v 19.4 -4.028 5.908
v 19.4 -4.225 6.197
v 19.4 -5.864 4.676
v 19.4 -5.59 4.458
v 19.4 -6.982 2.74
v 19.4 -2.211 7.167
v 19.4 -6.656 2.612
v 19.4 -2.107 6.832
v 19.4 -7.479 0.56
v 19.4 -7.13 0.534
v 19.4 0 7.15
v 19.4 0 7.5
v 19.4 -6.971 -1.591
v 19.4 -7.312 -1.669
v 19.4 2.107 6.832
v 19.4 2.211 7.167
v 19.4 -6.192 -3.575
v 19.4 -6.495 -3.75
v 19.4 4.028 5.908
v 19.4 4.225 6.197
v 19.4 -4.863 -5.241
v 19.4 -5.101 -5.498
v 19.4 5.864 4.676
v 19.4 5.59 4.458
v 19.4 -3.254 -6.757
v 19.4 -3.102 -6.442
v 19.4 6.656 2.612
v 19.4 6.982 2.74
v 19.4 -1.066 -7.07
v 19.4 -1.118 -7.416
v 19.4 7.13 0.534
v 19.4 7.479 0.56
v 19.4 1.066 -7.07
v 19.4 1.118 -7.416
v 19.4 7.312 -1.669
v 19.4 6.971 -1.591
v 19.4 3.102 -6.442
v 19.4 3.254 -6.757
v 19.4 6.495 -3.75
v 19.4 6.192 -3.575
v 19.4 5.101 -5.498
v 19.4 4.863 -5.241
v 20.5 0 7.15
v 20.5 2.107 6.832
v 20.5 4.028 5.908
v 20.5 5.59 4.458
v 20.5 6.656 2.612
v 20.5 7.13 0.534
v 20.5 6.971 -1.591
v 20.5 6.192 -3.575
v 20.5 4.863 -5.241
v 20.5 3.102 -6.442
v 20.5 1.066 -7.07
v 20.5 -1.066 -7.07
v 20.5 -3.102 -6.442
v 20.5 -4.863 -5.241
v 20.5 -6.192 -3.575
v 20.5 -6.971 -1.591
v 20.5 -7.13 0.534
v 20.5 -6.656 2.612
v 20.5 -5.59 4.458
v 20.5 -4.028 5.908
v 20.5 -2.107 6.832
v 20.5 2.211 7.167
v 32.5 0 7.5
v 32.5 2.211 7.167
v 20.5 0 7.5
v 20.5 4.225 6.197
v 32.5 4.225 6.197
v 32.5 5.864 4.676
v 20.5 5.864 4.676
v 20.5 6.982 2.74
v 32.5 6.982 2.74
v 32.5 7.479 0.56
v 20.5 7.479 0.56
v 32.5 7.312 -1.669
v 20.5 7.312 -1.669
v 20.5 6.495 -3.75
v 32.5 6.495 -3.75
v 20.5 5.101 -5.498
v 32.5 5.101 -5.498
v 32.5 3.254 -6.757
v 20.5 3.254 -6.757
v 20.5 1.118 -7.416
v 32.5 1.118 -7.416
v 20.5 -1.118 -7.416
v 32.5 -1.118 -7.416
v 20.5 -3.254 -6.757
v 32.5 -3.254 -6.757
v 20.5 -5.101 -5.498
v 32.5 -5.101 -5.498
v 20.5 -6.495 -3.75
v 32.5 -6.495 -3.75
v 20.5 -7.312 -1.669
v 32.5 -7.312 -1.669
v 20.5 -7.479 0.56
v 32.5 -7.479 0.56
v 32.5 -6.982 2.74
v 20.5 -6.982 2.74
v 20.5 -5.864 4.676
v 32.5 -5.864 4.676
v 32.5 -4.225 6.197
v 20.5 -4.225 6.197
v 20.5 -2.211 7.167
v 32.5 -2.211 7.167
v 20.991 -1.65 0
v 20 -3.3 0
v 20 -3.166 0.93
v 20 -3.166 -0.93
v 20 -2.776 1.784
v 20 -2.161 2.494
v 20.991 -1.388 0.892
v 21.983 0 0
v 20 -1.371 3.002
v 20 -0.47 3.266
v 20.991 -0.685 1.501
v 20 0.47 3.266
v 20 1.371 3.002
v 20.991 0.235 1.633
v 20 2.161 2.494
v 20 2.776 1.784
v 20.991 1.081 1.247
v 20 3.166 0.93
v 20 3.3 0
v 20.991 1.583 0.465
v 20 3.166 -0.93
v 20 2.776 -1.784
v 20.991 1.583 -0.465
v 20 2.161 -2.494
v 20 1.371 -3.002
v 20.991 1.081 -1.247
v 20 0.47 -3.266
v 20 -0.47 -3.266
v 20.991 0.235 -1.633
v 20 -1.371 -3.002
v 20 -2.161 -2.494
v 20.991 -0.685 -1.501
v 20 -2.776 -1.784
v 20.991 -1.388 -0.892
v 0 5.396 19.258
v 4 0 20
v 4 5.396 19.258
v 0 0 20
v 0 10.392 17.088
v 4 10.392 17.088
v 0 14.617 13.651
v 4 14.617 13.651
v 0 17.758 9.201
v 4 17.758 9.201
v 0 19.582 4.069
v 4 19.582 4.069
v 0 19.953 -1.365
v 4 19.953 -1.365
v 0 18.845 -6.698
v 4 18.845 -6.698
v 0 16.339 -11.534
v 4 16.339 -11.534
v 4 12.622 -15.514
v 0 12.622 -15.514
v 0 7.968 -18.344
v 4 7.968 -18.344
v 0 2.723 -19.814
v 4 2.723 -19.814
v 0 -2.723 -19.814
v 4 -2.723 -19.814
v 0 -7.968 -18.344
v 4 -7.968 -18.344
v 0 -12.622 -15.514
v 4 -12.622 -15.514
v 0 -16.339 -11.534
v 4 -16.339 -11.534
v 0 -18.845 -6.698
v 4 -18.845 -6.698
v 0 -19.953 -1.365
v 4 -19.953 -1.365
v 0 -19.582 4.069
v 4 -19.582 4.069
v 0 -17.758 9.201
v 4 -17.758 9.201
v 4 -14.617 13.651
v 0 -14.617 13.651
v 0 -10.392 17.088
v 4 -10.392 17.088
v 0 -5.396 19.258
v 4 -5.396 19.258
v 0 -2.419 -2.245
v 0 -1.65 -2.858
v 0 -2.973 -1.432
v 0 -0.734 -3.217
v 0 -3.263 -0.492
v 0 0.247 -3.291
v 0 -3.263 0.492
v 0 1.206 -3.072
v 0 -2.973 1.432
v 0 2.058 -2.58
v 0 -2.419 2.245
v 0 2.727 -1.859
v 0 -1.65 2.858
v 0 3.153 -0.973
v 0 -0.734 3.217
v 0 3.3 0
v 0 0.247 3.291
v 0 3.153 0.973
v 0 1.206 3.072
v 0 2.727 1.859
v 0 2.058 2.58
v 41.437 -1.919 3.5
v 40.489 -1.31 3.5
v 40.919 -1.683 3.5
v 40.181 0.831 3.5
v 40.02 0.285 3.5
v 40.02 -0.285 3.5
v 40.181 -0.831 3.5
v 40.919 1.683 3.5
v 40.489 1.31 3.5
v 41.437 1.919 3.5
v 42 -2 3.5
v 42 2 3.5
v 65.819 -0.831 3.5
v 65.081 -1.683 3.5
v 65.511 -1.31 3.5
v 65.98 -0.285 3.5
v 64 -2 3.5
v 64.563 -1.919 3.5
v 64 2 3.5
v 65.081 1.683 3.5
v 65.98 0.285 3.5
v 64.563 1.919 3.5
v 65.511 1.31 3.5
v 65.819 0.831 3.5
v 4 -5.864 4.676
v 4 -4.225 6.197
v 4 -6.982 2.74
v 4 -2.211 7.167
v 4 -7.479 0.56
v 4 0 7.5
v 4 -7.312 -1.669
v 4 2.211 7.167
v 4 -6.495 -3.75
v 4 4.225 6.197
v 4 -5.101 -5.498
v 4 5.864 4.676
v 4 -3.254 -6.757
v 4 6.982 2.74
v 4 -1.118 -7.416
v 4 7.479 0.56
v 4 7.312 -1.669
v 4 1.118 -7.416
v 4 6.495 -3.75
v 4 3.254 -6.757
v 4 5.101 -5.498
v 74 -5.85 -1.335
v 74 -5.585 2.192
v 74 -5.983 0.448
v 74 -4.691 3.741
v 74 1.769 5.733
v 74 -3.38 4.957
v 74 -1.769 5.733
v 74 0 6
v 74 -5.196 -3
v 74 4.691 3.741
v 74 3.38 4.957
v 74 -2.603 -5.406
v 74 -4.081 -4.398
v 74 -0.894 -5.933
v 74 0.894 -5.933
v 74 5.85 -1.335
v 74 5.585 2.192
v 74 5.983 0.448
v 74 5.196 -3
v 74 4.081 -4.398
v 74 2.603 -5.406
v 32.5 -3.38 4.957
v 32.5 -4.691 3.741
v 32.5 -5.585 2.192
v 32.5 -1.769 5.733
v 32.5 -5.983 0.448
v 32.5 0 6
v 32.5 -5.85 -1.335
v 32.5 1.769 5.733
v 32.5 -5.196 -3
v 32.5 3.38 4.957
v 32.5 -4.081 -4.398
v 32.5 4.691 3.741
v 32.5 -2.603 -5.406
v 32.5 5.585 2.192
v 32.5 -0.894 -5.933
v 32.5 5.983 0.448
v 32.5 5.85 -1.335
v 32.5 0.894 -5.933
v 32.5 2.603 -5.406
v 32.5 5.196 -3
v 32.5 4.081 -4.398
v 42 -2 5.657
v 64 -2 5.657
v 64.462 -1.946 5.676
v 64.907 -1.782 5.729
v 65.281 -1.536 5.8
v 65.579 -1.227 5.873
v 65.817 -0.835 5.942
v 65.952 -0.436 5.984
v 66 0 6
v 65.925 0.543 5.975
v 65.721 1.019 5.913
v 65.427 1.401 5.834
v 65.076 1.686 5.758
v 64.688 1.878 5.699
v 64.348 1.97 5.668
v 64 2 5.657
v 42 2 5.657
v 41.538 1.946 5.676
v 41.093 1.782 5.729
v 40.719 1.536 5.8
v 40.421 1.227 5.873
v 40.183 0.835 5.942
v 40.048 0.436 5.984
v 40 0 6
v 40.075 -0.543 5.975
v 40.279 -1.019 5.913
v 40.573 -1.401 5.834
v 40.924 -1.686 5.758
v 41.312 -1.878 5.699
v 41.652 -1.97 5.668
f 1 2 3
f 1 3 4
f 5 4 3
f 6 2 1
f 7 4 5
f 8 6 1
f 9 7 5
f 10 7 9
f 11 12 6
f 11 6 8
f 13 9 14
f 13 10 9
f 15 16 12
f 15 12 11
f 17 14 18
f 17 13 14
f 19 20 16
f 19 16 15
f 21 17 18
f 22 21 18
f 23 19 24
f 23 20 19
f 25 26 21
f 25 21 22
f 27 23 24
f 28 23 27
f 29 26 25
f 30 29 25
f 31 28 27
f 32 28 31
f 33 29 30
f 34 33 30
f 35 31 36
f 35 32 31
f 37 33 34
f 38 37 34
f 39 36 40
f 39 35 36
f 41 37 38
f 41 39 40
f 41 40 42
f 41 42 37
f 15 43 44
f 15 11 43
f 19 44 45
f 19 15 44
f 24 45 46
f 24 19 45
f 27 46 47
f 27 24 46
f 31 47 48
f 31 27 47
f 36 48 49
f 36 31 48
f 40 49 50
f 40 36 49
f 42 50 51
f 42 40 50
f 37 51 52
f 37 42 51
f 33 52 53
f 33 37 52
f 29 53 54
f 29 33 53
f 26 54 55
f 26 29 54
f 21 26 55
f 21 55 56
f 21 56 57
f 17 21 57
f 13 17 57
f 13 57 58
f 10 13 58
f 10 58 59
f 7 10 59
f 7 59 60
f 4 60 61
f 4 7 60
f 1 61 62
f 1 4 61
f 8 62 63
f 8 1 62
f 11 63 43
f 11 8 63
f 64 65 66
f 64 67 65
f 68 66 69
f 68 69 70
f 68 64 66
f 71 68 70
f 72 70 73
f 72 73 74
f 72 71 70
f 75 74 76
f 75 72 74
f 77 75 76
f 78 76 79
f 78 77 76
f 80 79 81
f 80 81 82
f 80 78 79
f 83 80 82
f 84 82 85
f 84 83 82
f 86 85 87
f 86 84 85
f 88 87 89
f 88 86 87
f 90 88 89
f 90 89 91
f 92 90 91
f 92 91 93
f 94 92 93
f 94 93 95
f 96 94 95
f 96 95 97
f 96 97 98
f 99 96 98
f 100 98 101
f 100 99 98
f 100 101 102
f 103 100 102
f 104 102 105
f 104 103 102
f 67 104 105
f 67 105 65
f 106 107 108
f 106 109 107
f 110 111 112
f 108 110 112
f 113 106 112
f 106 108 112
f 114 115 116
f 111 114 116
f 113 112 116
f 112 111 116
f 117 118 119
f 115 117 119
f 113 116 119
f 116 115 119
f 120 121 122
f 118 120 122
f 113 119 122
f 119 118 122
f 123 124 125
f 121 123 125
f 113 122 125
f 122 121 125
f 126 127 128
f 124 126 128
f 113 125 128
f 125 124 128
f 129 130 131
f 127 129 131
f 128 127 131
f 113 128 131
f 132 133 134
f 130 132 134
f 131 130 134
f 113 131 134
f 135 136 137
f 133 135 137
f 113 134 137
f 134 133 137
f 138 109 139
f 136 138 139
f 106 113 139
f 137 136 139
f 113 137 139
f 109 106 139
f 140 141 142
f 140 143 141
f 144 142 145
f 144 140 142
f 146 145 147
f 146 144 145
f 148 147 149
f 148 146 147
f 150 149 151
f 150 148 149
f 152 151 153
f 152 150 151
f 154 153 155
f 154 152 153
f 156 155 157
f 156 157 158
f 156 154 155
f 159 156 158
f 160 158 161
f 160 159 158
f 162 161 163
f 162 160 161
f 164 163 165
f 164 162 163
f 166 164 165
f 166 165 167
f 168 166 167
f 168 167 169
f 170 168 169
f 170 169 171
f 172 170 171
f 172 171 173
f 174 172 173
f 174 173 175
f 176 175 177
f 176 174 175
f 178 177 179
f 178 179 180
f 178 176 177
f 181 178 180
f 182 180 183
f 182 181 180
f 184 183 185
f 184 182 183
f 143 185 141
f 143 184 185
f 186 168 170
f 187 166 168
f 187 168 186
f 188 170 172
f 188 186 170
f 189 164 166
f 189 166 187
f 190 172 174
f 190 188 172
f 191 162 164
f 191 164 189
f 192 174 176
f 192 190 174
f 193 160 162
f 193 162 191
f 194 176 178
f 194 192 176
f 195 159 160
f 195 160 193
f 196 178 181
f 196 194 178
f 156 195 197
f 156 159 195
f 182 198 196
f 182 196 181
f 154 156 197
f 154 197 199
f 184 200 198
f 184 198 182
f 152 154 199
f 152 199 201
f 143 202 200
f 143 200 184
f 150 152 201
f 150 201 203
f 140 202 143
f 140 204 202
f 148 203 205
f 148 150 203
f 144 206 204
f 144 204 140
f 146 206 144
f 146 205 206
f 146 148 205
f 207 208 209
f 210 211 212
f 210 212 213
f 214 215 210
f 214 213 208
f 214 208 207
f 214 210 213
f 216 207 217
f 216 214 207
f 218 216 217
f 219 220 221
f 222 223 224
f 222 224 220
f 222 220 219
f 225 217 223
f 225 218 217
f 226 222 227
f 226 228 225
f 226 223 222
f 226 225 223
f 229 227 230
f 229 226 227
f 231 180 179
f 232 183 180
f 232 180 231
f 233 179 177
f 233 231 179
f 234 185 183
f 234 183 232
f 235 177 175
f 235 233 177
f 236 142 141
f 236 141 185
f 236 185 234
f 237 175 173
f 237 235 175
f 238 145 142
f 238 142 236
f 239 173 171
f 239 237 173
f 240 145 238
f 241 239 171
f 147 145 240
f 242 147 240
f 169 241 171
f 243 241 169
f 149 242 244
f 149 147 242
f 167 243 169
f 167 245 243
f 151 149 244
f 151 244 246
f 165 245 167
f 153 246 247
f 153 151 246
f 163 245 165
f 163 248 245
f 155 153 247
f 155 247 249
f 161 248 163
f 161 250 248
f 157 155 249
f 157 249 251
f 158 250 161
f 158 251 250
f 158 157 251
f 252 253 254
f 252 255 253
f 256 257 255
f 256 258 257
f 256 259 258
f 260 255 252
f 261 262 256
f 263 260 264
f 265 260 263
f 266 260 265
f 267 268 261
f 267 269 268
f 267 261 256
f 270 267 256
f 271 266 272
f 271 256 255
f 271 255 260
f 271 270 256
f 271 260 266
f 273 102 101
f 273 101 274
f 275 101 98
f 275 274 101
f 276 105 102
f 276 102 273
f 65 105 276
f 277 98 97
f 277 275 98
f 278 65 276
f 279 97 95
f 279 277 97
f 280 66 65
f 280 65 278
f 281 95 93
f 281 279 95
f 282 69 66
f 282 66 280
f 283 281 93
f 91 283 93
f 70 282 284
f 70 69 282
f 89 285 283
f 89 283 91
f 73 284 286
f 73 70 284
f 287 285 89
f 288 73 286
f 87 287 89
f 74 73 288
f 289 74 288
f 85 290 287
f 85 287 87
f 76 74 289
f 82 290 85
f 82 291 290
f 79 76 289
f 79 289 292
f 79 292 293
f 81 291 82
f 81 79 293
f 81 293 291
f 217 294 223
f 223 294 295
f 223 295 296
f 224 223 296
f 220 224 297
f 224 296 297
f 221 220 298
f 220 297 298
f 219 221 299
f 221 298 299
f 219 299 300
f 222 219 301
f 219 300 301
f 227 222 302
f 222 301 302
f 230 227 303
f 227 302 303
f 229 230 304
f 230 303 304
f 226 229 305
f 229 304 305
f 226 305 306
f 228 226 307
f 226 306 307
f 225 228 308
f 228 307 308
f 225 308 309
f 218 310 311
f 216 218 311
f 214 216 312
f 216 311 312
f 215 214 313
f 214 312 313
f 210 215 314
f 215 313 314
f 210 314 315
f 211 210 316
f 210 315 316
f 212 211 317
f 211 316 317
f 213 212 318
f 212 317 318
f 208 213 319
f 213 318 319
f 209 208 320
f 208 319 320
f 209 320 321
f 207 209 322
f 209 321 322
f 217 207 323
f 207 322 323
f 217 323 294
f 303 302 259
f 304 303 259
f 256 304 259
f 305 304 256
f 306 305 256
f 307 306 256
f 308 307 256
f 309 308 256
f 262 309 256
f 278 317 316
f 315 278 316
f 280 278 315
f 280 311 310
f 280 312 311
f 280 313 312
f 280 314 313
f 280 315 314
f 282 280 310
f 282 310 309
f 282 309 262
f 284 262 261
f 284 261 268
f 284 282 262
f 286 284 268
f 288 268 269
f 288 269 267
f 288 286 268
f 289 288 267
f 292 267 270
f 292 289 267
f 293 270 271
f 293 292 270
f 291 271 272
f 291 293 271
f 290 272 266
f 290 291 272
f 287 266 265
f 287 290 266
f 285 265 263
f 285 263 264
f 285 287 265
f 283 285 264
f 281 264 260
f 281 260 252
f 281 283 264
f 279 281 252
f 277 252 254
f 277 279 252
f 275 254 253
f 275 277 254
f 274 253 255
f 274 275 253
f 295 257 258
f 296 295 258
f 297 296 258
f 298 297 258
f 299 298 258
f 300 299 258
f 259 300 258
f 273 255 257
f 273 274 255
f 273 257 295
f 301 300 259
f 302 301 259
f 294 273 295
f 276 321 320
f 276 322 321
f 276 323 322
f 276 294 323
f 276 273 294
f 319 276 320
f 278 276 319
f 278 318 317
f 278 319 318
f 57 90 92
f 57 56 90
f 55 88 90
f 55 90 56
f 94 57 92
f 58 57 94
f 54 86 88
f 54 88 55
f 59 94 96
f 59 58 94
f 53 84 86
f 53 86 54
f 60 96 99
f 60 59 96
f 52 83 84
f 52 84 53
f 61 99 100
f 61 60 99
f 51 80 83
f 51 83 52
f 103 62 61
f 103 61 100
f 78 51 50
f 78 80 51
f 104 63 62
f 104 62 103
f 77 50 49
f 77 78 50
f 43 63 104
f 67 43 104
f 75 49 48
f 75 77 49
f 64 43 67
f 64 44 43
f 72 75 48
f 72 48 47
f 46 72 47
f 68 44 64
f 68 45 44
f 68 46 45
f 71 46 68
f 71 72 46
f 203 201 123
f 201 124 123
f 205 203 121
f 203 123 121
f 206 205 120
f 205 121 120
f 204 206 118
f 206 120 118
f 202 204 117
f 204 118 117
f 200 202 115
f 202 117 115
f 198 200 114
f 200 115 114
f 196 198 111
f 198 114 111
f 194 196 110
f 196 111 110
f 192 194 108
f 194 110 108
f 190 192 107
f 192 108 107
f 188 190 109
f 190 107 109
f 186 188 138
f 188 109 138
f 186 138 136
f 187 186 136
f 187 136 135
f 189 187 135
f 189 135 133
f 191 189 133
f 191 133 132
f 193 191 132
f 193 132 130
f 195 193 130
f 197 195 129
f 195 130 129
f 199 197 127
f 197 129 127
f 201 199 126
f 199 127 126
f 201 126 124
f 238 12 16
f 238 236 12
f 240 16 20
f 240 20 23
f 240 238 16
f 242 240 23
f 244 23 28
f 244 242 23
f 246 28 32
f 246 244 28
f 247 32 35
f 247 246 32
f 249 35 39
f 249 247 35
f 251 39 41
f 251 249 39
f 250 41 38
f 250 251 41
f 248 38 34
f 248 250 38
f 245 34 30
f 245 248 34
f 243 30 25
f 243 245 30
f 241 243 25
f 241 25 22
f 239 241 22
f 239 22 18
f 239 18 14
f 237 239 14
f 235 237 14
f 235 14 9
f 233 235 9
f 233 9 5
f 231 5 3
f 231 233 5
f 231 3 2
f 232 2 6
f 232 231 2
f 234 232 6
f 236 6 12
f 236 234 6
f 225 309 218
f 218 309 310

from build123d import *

# Parameters (mm, degrees)
F4_DEPTH = 2.5
F6_D     = 6.6
F6_DEPTH = 20
F6_TIP   = 1.9828400428


with BuildPart() as f1:
    # F0 (on Front) → F1 (revolve)
    with BuildSketch(Plane.XZ):
        Polygon((0, 20), (0, 0), (74, 0), (74, 6), (32.5, 6), (32.5, 7.5), (20.5, 7.5), (20.5, 7.15), (19.4, 7.15), (19.4, 7.5), (4, 7.5), (4, 20), align=None)
    revolve(axis=Axis((37, 0, 0), (-1, 0, 0)))

    # F3 (on offset) → F4 (cut)
    with BuildSketch(Plane.XY.offset(6)):
        with BuildLine():
            ThreePointArc((42, 2), (40, 0), (42, -2))
            Line((42, -2), (64, -2))
            ThreePointArc((64, -2), (66, 0), (64, 2))
            Line((64, 2), (42, 2))
        make_face()
    extrude(amount=-F4_DEPTH, mode=Mode.SUBTRACT)

    # F6
    with Locations(Plane(origin=(0, 0, 0), x_dir=(0, -1, 0), z_dir=(-1, 0, 0))):
        with Locations((0, 0)):
            Hole(F6_D / 2, depth=F6_DEPTH)
            with Locations((0, 0, -(F6_DEPTH + F6_TIP / 2))):  # 118° drill point
                Cone(0, F6_D / 2, F6_TIP, mode=Mode.SUBTRACT)


solid = f1.part
